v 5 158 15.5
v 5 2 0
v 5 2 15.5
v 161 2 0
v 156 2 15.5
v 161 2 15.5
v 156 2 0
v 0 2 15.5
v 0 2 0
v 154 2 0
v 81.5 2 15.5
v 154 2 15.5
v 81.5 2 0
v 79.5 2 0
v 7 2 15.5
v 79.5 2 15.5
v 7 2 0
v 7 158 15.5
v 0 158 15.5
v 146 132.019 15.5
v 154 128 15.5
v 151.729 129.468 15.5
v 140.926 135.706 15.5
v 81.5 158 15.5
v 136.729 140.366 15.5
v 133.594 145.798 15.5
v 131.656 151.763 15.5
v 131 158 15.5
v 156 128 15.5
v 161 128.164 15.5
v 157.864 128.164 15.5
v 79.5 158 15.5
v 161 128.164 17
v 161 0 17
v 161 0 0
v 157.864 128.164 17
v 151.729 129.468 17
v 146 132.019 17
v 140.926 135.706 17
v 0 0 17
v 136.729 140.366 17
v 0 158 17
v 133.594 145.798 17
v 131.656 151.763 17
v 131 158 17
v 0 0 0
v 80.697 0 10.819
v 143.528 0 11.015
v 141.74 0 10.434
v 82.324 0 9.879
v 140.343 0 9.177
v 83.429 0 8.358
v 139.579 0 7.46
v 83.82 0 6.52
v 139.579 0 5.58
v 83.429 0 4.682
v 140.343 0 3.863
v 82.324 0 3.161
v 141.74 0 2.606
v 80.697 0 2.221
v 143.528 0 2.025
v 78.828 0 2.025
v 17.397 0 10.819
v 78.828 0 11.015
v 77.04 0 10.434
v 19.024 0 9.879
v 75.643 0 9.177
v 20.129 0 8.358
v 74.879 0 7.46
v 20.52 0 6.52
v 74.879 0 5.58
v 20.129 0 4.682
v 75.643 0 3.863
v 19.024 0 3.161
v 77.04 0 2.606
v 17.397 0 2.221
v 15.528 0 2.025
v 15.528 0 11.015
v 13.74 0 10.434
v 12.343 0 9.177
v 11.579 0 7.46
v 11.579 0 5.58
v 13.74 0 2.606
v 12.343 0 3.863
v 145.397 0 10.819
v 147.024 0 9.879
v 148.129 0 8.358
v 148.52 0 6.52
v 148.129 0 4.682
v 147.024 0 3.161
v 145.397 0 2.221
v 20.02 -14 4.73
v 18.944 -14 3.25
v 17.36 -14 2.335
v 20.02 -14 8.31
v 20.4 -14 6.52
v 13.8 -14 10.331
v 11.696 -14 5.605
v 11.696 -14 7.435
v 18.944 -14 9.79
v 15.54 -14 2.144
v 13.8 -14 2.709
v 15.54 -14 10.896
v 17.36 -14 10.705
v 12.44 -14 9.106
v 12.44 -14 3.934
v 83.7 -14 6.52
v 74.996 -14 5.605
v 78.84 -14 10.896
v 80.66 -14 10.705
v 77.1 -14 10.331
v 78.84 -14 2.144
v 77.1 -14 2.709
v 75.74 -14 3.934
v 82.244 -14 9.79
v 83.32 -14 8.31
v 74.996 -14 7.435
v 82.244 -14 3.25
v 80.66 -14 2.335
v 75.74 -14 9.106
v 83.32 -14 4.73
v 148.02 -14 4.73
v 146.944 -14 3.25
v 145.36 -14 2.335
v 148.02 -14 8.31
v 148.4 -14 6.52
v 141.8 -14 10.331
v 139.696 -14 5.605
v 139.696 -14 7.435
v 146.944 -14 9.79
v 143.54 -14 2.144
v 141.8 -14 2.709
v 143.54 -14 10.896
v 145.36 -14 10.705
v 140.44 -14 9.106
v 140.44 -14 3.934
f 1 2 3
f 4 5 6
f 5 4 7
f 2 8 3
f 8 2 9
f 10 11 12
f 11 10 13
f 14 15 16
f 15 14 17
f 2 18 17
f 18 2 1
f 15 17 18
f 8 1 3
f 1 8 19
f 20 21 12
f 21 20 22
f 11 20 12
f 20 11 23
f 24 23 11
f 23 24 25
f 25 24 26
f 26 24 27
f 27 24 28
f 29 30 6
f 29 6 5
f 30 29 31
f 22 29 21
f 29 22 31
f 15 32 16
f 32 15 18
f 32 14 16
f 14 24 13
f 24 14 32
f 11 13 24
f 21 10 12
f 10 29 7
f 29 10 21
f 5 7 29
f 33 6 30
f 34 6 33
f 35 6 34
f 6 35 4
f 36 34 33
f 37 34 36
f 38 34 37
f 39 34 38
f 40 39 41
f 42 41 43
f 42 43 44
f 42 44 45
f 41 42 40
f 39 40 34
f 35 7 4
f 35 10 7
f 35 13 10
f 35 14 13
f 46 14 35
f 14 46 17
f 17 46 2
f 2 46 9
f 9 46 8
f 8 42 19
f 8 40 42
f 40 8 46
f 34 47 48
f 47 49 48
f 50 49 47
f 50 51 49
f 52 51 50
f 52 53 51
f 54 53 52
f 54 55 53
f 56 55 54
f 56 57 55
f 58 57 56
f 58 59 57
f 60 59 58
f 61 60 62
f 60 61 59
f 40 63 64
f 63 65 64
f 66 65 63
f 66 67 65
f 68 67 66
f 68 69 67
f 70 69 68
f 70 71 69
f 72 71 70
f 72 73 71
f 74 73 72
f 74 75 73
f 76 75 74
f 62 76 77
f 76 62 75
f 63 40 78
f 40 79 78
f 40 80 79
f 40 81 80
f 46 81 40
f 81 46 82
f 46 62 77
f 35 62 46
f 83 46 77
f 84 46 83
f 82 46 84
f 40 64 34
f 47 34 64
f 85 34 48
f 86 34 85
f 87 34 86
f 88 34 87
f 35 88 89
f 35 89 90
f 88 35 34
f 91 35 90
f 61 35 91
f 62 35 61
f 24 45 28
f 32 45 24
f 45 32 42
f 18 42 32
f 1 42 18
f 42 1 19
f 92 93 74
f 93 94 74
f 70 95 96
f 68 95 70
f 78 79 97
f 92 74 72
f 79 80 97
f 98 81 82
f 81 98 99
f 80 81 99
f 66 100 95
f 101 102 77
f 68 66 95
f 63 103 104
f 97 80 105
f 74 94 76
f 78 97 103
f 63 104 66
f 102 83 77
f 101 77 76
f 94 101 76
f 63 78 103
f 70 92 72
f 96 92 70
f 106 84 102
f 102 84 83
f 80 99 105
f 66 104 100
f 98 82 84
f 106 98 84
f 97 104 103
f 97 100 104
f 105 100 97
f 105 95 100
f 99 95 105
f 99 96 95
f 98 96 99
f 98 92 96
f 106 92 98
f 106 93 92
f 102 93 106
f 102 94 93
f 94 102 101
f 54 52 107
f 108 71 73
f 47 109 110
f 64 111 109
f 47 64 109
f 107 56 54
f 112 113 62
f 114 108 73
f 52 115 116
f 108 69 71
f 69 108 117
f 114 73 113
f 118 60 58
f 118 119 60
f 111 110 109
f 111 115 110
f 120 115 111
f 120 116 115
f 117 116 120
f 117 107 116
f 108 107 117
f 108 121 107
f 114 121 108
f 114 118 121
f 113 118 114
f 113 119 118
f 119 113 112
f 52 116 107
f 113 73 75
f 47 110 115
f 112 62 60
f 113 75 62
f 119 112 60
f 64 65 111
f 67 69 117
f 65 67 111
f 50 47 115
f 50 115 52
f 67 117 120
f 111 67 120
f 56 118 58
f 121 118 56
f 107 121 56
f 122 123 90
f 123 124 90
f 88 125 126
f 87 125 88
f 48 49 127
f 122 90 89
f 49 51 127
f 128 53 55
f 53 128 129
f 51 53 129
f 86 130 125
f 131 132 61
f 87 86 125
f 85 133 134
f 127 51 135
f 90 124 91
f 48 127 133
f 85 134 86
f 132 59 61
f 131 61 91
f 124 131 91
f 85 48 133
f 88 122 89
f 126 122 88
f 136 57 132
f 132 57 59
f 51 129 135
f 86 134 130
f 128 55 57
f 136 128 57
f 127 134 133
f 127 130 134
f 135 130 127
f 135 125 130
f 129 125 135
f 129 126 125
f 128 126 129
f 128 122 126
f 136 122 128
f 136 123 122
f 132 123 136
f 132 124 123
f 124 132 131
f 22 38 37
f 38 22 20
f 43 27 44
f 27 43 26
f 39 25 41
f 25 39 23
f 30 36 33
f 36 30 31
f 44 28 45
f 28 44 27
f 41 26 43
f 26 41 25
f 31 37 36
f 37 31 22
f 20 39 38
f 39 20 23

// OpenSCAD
bottomThickness = 1.5;

width = 161;
height = 17;
depth = 158;
ribDepth = 2;
attachementCylinderRadMin = 4.4;
attachementCylinderRadMax = 4.52;
attachementBottomOffset = 2;
attachementDepth = 14;

cableCutOutRadius = 30;

body();


module body() {
    difference() {
        union() {
            cube([width, ribDepth, height]);

            translate([0, 0, height - bottomThickness])
            cube([width, depth, bottomThickness]);
    
            
            translate([0, ribDepth, height - bottomThickness]) {
                translate([5, 0, 0])
                rib(depth - ribDepth, height - bottomThickness, ribDepth);

                translate([(width - ribDepth) / 2, 0, 0])
                rib(depth - ribDepth, height - bottomThickness, ribDepth);

                translate([width - ribDepth - 5, 0, 0])
                rib(depth - ribDepth - cableCutOutRadius, height - bottomThickness, ribDepth);
            }
            
            


            translate([16, 0, attachementBottomOffset + attachementCylinderRadMax])
            rotate([90, 0, 0])
            cylinder(r1=attachementCylinderRadMax,r2=attachementCylinderRadMin, h=attachementDepth);

            translate([79.3, 0, attachementBottomOffset + attachementCylinderRadMax])
            rotate([90, 0, 0])
            cylinder(r1=attachementCylinderRadMax,r2=attachementCylinderRadMin, h=attachementDepth);

            translate([144, 0, attachementBottomOffset + attachementCylinderRadMax])
            rotate([90, 0, 0])
            cylinder(r1=attachementCylinderRadMax,r2=attachementCylinderRadMin, h=attachementDepth);
        }
        translate([width, depth, 0])
        cylinder(r=cableCutOutRadius, h=height);

    }
}
module rib(length, height, thickness) {
    rotate([0, 90, 0])
    linear_extrude(thickness)
    polygon(points=[[0,0],[height,0],[0,length]], paths=[[0,1,2]]);
//    cube([ribDepth, depth, height]);
}
